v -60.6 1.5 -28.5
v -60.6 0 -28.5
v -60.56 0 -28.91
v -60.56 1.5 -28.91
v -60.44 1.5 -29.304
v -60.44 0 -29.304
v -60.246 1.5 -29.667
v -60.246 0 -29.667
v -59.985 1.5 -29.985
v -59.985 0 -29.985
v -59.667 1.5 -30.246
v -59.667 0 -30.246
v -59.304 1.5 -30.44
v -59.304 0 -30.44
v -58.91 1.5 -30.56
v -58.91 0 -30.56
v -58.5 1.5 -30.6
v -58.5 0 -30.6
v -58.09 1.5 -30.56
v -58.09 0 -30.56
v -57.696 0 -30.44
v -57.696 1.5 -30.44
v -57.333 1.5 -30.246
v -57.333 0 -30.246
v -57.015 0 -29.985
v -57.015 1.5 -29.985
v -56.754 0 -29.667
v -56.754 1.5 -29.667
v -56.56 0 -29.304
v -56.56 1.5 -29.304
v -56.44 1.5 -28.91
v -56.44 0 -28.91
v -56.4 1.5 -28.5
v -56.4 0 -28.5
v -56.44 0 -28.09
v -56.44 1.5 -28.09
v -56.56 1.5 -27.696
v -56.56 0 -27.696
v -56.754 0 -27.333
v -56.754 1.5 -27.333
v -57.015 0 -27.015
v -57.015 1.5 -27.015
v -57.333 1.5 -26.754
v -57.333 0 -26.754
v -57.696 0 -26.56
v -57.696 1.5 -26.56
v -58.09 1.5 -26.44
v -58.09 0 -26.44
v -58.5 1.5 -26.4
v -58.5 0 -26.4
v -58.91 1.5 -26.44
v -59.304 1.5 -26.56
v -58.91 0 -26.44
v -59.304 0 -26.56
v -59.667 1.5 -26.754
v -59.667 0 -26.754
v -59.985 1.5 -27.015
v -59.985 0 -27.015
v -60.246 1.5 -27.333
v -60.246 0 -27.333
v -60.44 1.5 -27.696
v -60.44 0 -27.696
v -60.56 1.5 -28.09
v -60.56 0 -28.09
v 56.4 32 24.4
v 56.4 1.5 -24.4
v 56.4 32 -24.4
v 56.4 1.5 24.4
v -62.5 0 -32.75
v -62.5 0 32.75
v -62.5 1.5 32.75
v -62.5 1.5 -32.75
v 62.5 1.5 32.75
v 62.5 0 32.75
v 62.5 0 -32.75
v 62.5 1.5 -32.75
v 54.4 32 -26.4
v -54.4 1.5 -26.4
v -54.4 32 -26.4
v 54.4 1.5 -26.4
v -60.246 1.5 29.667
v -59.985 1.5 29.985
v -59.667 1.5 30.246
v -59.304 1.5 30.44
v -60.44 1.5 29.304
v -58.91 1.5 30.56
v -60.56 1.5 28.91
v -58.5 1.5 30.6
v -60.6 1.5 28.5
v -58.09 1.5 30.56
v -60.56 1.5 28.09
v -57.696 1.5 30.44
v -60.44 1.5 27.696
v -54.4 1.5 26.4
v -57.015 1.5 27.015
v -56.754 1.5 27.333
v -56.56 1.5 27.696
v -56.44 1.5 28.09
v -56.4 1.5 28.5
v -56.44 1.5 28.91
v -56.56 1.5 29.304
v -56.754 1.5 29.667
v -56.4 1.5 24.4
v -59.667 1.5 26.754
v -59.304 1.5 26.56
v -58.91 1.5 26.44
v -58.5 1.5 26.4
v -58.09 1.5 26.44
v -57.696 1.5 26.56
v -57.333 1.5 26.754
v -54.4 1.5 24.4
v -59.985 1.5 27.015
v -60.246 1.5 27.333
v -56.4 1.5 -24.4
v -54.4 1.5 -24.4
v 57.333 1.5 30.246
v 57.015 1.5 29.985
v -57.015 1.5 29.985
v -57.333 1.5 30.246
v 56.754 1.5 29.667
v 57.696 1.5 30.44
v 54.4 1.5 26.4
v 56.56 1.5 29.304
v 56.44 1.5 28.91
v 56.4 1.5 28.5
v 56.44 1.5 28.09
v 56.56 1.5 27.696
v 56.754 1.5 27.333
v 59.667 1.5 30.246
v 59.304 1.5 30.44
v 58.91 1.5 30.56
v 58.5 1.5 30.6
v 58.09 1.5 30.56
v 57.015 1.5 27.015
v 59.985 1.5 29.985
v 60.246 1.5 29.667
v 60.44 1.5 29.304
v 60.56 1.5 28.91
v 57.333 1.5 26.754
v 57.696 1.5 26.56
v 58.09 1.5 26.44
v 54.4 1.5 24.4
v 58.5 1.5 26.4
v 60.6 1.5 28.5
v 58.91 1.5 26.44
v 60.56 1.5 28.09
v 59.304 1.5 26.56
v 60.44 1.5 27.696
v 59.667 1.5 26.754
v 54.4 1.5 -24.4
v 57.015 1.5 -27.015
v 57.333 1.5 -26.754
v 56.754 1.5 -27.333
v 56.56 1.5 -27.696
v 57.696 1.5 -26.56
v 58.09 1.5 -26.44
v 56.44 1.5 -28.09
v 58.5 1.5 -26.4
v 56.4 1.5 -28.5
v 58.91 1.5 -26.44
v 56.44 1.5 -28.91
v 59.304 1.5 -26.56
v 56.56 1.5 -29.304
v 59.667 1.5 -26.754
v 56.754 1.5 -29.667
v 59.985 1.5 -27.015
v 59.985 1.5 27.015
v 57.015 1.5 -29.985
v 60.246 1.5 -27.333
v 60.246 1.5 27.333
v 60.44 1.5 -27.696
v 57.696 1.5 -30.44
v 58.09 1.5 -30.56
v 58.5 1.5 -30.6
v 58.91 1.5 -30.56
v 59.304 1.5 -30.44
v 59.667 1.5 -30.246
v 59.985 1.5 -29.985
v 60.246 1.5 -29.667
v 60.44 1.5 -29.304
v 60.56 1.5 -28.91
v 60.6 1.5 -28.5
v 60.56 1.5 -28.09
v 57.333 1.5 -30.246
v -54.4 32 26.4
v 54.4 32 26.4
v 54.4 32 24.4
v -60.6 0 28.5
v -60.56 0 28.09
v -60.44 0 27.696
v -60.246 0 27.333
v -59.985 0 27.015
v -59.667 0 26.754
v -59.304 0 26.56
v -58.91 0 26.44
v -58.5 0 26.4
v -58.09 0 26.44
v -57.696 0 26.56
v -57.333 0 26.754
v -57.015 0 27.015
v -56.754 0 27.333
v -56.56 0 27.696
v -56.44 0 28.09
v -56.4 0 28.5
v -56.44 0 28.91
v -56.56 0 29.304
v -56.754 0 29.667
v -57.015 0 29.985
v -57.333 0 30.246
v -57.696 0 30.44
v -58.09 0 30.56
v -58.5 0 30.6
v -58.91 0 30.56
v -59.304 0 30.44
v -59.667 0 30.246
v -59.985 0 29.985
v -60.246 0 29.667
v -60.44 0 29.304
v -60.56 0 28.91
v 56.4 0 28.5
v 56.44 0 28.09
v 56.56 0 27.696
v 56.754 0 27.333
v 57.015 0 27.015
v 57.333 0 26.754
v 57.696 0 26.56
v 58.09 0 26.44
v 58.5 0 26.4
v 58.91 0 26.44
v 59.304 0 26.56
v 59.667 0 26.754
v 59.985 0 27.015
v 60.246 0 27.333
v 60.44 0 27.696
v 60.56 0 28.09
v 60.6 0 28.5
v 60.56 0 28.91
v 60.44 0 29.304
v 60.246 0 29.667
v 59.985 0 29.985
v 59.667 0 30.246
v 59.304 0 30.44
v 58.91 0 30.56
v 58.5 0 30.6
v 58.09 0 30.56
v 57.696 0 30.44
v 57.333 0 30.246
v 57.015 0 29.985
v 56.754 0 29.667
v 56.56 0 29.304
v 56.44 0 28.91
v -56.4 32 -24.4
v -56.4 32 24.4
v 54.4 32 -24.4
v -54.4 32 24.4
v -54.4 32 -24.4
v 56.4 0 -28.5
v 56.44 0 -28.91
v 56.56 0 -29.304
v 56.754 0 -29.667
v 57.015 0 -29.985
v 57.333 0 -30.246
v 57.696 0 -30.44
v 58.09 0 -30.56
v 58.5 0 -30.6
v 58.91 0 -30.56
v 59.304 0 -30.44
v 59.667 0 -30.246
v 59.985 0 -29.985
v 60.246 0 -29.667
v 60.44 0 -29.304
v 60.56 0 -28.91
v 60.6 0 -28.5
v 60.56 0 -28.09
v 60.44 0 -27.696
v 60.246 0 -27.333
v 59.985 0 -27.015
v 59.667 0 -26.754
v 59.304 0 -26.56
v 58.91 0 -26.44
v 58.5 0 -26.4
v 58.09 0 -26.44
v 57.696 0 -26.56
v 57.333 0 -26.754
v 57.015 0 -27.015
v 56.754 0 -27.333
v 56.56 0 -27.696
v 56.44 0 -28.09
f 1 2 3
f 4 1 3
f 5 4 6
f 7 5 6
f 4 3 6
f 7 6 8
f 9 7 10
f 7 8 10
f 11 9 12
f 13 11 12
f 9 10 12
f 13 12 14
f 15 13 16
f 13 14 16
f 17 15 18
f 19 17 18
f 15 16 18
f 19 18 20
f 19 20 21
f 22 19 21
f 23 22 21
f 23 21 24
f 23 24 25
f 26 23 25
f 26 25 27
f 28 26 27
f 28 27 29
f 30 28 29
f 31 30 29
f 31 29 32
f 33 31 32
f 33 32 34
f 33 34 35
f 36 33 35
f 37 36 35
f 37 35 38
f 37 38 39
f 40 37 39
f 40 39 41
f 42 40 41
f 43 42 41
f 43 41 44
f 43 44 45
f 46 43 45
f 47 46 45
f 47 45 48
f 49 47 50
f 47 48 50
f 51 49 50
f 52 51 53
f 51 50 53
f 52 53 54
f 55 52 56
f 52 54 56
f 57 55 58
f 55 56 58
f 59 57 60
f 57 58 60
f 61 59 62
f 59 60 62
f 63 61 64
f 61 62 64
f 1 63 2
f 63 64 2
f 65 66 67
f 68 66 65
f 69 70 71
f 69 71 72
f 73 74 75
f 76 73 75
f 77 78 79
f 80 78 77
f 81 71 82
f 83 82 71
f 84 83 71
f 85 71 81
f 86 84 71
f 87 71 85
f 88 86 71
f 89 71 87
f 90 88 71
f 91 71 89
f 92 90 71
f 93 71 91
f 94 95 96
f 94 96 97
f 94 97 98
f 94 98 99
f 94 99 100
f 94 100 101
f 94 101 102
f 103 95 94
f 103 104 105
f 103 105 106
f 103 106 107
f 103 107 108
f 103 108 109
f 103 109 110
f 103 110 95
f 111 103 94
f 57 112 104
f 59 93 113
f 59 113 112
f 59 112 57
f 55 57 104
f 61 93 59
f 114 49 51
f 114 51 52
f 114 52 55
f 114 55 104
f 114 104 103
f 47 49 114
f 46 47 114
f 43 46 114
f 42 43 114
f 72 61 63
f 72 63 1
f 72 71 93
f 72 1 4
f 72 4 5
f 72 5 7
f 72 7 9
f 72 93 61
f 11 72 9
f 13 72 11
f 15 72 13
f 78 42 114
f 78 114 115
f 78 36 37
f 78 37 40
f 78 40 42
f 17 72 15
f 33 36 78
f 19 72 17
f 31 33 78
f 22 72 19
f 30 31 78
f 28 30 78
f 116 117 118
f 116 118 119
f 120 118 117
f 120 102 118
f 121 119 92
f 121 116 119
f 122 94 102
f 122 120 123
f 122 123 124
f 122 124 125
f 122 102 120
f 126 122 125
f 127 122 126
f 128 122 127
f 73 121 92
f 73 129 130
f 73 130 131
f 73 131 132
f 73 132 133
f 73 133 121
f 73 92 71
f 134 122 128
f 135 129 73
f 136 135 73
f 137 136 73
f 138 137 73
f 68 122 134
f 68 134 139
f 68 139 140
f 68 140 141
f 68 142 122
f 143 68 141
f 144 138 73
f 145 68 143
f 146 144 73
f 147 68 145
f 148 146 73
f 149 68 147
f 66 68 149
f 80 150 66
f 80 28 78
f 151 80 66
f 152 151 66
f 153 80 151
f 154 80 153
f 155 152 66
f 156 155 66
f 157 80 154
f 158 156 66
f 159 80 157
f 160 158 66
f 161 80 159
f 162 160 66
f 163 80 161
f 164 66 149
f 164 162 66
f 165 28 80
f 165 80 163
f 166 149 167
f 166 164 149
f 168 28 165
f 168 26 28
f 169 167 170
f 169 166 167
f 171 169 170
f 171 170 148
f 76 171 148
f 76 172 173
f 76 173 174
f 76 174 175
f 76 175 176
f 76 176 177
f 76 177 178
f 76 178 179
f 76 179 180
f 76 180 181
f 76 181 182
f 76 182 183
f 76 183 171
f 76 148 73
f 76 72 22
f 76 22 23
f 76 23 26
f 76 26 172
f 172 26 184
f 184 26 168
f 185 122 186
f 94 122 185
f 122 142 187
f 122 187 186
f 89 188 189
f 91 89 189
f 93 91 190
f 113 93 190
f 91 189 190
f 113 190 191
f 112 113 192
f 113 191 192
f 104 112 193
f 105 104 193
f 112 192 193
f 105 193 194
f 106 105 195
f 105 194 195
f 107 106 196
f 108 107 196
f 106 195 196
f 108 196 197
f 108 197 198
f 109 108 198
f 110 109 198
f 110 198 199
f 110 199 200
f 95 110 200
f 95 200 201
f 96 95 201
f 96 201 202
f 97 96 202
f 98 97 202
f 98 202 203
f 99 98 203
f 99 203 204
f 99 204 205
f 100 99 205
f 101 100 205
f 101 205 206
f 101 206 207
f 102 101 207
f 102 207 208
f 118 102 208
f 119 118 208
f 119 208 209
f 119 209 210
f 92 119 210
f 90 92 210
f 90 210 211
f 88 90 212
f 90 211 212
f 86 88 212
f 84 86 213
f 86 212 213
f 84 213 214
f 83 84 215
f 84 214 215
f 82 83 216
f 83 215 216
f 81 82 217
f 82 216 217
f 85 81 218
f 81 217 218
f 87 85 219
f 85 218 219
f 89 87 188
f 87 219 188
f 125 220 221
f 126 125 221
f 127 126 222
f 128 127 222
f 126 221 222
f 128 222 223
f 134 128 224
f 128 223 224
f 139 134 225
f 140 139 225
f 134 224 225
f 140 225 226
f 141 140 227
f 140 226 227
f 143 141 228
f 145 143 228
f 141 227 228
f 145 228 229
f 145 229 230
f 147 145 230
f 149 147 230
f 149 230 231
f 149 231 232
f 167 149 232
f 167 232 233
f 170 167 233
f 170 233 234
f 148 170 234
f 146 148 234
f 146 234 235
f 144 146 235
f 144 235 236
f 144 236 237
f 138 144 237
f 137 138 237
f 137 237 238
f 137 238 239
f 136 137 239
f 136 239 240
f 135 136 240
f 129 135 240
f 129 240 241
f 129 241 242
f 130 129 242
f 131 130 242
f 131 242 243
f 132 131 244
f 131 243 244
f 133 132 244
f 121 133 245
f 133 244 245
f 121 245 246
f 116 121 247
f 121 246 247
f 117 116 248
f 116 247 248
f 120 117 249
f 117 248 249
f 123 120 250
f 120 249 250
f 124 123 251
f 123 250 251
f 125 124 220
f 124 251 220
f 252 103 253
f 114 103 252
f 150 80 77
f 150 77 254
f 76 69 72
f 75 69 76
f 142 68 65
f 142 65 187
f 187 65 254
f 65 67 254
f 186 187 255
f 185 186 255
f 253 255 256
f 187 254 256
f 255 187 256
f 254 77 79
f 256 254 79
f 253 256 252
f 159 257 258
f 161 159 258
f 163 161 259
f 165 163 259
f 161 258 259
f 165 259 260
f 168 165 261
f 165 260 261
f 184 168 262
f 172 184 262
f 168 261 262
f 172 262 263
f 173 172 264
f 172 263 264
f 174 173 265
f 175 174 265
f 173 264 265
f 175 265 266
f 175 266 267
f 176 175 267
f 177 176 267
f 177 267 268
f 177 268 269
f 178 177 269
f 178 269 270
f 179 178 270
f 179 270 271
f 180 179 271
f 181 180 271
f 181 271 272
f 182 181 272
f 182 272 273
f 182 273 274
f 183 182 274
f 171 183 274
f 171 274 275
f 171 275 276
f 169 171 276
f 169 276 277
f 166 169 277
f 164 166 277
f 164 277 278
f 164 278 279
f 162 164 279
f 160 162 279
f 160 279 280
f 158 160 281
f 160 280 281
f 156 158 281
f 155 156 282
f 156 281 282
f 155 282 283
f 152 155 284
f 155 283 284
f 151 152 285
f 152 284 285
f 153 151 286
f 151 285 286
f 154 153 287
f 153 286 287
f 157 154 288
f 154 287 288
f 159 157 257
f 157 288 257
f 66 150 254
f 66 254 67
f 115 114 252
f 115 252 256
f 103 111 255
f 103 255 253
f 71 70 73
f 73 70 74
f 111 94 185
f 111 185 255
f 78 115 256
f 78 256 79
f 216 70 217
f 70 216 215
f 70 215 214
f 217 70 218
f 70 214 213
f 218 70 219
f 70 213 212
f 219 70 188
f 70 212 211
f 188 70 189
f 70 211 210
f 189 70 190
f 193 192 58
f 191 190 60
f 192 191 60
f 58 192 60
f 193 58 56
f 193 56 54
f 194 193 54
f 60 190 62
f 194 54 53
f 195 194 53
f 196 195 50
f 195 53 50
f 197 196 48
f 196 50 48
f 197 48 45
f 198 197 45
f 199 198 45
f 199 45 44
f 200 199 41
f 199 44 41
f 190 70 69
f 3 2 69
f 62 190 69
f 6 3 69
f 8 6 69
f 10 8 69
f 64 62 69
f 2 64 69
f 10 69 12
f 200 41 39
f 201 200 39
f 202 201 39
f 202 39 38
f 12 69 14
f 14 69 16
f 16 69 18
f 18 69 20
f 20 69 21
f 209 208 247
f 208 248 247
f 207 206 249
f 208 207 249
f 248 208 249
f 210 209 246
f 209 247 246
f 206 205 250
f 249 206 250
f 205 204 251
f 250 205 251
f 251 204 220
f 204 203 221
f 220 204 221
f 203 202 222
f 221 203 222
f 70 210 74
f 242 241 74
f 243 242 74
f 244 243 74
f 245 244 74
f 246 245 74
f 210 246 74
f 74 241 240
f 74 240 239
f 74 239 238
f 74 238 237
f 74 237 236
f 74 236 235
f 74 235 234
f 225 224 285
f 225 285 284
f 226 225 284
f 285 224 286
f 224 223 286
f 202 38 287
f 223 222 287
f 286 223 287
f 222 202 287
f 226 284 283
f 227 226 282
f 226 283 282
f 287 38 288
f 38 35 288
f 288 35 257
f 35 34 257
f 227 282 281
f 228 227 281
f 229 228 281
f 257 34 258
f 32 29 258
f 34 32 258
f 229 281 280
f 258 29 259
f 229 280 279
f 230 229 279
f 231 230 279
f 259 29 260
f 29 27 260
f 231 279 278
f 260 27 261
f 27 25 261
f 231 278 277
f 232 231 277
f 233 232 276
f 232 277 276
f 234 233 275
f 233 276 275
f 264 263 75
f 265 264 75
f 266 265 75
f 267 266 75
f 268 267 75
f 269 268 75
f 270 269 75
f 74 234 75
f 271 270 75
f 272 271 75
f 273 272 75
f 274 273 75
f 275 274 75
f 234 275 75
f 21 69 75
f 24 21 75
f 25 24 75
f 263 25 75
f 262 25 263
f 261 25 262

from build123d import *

# Parameters (mm, degrees)
SKETCH_1_W        = 125
SKETCH_1_H        = 65.5
EXTRUDE_1_DEPTH   = 1.5
HOLE_WIZARD_M41_D = 4.2
EXTRUDE_2_DEPTH   = 30.5


with BuildPart() as part:
    # Эскиз1 → Бобышка-Вытянуть1 (new body)
    with BuildSketch(Plane(origin=(0, 0, 0), x_dir=(1, 0, 0), z_dir=(0, 1, 0))):
        Rectangle(SKETCH_1_W, SKETCH_1_H)
    extrude(amount=EXTRUDE_1_DEPTH)

    # Сверло под метчик  спиральное M41 (through all)
    with Locations(Plane(origin=(0, 1.5, 0), x_dir=(1, 0, 0), z_dir=(0, 1, 0))):
        with Locations((-58.5, -28.5), (-58.5, 28.5), (58.5, 28.5), (58.5, -28.5)):
            Hole(HOLE_WIZARD_M41_D / 2)

    # Эскиз6 → Бобышка-Вытянуть2 (add)
    with BuildSketch(Plane(origin=(0, 1.5, 0), x_dir=(1, 0, 0), z_dir=(0, 1, 0))):
        Polygon((56.4, -24.4), (54.4, -24.4), (54.4, -26.4), (-54.4, -26.4), (-54.4, -24.4), (-56.4, -24.4), (-56.4, 24.4), (-54.4, 24.4), (-54.4, 26.4), (54.4, 26.4), (54.4, 24.4), (56.4, 24.4), align=None)
    extrude(amount=EXTRUDE_2_DEPTH)


solid = part.part
